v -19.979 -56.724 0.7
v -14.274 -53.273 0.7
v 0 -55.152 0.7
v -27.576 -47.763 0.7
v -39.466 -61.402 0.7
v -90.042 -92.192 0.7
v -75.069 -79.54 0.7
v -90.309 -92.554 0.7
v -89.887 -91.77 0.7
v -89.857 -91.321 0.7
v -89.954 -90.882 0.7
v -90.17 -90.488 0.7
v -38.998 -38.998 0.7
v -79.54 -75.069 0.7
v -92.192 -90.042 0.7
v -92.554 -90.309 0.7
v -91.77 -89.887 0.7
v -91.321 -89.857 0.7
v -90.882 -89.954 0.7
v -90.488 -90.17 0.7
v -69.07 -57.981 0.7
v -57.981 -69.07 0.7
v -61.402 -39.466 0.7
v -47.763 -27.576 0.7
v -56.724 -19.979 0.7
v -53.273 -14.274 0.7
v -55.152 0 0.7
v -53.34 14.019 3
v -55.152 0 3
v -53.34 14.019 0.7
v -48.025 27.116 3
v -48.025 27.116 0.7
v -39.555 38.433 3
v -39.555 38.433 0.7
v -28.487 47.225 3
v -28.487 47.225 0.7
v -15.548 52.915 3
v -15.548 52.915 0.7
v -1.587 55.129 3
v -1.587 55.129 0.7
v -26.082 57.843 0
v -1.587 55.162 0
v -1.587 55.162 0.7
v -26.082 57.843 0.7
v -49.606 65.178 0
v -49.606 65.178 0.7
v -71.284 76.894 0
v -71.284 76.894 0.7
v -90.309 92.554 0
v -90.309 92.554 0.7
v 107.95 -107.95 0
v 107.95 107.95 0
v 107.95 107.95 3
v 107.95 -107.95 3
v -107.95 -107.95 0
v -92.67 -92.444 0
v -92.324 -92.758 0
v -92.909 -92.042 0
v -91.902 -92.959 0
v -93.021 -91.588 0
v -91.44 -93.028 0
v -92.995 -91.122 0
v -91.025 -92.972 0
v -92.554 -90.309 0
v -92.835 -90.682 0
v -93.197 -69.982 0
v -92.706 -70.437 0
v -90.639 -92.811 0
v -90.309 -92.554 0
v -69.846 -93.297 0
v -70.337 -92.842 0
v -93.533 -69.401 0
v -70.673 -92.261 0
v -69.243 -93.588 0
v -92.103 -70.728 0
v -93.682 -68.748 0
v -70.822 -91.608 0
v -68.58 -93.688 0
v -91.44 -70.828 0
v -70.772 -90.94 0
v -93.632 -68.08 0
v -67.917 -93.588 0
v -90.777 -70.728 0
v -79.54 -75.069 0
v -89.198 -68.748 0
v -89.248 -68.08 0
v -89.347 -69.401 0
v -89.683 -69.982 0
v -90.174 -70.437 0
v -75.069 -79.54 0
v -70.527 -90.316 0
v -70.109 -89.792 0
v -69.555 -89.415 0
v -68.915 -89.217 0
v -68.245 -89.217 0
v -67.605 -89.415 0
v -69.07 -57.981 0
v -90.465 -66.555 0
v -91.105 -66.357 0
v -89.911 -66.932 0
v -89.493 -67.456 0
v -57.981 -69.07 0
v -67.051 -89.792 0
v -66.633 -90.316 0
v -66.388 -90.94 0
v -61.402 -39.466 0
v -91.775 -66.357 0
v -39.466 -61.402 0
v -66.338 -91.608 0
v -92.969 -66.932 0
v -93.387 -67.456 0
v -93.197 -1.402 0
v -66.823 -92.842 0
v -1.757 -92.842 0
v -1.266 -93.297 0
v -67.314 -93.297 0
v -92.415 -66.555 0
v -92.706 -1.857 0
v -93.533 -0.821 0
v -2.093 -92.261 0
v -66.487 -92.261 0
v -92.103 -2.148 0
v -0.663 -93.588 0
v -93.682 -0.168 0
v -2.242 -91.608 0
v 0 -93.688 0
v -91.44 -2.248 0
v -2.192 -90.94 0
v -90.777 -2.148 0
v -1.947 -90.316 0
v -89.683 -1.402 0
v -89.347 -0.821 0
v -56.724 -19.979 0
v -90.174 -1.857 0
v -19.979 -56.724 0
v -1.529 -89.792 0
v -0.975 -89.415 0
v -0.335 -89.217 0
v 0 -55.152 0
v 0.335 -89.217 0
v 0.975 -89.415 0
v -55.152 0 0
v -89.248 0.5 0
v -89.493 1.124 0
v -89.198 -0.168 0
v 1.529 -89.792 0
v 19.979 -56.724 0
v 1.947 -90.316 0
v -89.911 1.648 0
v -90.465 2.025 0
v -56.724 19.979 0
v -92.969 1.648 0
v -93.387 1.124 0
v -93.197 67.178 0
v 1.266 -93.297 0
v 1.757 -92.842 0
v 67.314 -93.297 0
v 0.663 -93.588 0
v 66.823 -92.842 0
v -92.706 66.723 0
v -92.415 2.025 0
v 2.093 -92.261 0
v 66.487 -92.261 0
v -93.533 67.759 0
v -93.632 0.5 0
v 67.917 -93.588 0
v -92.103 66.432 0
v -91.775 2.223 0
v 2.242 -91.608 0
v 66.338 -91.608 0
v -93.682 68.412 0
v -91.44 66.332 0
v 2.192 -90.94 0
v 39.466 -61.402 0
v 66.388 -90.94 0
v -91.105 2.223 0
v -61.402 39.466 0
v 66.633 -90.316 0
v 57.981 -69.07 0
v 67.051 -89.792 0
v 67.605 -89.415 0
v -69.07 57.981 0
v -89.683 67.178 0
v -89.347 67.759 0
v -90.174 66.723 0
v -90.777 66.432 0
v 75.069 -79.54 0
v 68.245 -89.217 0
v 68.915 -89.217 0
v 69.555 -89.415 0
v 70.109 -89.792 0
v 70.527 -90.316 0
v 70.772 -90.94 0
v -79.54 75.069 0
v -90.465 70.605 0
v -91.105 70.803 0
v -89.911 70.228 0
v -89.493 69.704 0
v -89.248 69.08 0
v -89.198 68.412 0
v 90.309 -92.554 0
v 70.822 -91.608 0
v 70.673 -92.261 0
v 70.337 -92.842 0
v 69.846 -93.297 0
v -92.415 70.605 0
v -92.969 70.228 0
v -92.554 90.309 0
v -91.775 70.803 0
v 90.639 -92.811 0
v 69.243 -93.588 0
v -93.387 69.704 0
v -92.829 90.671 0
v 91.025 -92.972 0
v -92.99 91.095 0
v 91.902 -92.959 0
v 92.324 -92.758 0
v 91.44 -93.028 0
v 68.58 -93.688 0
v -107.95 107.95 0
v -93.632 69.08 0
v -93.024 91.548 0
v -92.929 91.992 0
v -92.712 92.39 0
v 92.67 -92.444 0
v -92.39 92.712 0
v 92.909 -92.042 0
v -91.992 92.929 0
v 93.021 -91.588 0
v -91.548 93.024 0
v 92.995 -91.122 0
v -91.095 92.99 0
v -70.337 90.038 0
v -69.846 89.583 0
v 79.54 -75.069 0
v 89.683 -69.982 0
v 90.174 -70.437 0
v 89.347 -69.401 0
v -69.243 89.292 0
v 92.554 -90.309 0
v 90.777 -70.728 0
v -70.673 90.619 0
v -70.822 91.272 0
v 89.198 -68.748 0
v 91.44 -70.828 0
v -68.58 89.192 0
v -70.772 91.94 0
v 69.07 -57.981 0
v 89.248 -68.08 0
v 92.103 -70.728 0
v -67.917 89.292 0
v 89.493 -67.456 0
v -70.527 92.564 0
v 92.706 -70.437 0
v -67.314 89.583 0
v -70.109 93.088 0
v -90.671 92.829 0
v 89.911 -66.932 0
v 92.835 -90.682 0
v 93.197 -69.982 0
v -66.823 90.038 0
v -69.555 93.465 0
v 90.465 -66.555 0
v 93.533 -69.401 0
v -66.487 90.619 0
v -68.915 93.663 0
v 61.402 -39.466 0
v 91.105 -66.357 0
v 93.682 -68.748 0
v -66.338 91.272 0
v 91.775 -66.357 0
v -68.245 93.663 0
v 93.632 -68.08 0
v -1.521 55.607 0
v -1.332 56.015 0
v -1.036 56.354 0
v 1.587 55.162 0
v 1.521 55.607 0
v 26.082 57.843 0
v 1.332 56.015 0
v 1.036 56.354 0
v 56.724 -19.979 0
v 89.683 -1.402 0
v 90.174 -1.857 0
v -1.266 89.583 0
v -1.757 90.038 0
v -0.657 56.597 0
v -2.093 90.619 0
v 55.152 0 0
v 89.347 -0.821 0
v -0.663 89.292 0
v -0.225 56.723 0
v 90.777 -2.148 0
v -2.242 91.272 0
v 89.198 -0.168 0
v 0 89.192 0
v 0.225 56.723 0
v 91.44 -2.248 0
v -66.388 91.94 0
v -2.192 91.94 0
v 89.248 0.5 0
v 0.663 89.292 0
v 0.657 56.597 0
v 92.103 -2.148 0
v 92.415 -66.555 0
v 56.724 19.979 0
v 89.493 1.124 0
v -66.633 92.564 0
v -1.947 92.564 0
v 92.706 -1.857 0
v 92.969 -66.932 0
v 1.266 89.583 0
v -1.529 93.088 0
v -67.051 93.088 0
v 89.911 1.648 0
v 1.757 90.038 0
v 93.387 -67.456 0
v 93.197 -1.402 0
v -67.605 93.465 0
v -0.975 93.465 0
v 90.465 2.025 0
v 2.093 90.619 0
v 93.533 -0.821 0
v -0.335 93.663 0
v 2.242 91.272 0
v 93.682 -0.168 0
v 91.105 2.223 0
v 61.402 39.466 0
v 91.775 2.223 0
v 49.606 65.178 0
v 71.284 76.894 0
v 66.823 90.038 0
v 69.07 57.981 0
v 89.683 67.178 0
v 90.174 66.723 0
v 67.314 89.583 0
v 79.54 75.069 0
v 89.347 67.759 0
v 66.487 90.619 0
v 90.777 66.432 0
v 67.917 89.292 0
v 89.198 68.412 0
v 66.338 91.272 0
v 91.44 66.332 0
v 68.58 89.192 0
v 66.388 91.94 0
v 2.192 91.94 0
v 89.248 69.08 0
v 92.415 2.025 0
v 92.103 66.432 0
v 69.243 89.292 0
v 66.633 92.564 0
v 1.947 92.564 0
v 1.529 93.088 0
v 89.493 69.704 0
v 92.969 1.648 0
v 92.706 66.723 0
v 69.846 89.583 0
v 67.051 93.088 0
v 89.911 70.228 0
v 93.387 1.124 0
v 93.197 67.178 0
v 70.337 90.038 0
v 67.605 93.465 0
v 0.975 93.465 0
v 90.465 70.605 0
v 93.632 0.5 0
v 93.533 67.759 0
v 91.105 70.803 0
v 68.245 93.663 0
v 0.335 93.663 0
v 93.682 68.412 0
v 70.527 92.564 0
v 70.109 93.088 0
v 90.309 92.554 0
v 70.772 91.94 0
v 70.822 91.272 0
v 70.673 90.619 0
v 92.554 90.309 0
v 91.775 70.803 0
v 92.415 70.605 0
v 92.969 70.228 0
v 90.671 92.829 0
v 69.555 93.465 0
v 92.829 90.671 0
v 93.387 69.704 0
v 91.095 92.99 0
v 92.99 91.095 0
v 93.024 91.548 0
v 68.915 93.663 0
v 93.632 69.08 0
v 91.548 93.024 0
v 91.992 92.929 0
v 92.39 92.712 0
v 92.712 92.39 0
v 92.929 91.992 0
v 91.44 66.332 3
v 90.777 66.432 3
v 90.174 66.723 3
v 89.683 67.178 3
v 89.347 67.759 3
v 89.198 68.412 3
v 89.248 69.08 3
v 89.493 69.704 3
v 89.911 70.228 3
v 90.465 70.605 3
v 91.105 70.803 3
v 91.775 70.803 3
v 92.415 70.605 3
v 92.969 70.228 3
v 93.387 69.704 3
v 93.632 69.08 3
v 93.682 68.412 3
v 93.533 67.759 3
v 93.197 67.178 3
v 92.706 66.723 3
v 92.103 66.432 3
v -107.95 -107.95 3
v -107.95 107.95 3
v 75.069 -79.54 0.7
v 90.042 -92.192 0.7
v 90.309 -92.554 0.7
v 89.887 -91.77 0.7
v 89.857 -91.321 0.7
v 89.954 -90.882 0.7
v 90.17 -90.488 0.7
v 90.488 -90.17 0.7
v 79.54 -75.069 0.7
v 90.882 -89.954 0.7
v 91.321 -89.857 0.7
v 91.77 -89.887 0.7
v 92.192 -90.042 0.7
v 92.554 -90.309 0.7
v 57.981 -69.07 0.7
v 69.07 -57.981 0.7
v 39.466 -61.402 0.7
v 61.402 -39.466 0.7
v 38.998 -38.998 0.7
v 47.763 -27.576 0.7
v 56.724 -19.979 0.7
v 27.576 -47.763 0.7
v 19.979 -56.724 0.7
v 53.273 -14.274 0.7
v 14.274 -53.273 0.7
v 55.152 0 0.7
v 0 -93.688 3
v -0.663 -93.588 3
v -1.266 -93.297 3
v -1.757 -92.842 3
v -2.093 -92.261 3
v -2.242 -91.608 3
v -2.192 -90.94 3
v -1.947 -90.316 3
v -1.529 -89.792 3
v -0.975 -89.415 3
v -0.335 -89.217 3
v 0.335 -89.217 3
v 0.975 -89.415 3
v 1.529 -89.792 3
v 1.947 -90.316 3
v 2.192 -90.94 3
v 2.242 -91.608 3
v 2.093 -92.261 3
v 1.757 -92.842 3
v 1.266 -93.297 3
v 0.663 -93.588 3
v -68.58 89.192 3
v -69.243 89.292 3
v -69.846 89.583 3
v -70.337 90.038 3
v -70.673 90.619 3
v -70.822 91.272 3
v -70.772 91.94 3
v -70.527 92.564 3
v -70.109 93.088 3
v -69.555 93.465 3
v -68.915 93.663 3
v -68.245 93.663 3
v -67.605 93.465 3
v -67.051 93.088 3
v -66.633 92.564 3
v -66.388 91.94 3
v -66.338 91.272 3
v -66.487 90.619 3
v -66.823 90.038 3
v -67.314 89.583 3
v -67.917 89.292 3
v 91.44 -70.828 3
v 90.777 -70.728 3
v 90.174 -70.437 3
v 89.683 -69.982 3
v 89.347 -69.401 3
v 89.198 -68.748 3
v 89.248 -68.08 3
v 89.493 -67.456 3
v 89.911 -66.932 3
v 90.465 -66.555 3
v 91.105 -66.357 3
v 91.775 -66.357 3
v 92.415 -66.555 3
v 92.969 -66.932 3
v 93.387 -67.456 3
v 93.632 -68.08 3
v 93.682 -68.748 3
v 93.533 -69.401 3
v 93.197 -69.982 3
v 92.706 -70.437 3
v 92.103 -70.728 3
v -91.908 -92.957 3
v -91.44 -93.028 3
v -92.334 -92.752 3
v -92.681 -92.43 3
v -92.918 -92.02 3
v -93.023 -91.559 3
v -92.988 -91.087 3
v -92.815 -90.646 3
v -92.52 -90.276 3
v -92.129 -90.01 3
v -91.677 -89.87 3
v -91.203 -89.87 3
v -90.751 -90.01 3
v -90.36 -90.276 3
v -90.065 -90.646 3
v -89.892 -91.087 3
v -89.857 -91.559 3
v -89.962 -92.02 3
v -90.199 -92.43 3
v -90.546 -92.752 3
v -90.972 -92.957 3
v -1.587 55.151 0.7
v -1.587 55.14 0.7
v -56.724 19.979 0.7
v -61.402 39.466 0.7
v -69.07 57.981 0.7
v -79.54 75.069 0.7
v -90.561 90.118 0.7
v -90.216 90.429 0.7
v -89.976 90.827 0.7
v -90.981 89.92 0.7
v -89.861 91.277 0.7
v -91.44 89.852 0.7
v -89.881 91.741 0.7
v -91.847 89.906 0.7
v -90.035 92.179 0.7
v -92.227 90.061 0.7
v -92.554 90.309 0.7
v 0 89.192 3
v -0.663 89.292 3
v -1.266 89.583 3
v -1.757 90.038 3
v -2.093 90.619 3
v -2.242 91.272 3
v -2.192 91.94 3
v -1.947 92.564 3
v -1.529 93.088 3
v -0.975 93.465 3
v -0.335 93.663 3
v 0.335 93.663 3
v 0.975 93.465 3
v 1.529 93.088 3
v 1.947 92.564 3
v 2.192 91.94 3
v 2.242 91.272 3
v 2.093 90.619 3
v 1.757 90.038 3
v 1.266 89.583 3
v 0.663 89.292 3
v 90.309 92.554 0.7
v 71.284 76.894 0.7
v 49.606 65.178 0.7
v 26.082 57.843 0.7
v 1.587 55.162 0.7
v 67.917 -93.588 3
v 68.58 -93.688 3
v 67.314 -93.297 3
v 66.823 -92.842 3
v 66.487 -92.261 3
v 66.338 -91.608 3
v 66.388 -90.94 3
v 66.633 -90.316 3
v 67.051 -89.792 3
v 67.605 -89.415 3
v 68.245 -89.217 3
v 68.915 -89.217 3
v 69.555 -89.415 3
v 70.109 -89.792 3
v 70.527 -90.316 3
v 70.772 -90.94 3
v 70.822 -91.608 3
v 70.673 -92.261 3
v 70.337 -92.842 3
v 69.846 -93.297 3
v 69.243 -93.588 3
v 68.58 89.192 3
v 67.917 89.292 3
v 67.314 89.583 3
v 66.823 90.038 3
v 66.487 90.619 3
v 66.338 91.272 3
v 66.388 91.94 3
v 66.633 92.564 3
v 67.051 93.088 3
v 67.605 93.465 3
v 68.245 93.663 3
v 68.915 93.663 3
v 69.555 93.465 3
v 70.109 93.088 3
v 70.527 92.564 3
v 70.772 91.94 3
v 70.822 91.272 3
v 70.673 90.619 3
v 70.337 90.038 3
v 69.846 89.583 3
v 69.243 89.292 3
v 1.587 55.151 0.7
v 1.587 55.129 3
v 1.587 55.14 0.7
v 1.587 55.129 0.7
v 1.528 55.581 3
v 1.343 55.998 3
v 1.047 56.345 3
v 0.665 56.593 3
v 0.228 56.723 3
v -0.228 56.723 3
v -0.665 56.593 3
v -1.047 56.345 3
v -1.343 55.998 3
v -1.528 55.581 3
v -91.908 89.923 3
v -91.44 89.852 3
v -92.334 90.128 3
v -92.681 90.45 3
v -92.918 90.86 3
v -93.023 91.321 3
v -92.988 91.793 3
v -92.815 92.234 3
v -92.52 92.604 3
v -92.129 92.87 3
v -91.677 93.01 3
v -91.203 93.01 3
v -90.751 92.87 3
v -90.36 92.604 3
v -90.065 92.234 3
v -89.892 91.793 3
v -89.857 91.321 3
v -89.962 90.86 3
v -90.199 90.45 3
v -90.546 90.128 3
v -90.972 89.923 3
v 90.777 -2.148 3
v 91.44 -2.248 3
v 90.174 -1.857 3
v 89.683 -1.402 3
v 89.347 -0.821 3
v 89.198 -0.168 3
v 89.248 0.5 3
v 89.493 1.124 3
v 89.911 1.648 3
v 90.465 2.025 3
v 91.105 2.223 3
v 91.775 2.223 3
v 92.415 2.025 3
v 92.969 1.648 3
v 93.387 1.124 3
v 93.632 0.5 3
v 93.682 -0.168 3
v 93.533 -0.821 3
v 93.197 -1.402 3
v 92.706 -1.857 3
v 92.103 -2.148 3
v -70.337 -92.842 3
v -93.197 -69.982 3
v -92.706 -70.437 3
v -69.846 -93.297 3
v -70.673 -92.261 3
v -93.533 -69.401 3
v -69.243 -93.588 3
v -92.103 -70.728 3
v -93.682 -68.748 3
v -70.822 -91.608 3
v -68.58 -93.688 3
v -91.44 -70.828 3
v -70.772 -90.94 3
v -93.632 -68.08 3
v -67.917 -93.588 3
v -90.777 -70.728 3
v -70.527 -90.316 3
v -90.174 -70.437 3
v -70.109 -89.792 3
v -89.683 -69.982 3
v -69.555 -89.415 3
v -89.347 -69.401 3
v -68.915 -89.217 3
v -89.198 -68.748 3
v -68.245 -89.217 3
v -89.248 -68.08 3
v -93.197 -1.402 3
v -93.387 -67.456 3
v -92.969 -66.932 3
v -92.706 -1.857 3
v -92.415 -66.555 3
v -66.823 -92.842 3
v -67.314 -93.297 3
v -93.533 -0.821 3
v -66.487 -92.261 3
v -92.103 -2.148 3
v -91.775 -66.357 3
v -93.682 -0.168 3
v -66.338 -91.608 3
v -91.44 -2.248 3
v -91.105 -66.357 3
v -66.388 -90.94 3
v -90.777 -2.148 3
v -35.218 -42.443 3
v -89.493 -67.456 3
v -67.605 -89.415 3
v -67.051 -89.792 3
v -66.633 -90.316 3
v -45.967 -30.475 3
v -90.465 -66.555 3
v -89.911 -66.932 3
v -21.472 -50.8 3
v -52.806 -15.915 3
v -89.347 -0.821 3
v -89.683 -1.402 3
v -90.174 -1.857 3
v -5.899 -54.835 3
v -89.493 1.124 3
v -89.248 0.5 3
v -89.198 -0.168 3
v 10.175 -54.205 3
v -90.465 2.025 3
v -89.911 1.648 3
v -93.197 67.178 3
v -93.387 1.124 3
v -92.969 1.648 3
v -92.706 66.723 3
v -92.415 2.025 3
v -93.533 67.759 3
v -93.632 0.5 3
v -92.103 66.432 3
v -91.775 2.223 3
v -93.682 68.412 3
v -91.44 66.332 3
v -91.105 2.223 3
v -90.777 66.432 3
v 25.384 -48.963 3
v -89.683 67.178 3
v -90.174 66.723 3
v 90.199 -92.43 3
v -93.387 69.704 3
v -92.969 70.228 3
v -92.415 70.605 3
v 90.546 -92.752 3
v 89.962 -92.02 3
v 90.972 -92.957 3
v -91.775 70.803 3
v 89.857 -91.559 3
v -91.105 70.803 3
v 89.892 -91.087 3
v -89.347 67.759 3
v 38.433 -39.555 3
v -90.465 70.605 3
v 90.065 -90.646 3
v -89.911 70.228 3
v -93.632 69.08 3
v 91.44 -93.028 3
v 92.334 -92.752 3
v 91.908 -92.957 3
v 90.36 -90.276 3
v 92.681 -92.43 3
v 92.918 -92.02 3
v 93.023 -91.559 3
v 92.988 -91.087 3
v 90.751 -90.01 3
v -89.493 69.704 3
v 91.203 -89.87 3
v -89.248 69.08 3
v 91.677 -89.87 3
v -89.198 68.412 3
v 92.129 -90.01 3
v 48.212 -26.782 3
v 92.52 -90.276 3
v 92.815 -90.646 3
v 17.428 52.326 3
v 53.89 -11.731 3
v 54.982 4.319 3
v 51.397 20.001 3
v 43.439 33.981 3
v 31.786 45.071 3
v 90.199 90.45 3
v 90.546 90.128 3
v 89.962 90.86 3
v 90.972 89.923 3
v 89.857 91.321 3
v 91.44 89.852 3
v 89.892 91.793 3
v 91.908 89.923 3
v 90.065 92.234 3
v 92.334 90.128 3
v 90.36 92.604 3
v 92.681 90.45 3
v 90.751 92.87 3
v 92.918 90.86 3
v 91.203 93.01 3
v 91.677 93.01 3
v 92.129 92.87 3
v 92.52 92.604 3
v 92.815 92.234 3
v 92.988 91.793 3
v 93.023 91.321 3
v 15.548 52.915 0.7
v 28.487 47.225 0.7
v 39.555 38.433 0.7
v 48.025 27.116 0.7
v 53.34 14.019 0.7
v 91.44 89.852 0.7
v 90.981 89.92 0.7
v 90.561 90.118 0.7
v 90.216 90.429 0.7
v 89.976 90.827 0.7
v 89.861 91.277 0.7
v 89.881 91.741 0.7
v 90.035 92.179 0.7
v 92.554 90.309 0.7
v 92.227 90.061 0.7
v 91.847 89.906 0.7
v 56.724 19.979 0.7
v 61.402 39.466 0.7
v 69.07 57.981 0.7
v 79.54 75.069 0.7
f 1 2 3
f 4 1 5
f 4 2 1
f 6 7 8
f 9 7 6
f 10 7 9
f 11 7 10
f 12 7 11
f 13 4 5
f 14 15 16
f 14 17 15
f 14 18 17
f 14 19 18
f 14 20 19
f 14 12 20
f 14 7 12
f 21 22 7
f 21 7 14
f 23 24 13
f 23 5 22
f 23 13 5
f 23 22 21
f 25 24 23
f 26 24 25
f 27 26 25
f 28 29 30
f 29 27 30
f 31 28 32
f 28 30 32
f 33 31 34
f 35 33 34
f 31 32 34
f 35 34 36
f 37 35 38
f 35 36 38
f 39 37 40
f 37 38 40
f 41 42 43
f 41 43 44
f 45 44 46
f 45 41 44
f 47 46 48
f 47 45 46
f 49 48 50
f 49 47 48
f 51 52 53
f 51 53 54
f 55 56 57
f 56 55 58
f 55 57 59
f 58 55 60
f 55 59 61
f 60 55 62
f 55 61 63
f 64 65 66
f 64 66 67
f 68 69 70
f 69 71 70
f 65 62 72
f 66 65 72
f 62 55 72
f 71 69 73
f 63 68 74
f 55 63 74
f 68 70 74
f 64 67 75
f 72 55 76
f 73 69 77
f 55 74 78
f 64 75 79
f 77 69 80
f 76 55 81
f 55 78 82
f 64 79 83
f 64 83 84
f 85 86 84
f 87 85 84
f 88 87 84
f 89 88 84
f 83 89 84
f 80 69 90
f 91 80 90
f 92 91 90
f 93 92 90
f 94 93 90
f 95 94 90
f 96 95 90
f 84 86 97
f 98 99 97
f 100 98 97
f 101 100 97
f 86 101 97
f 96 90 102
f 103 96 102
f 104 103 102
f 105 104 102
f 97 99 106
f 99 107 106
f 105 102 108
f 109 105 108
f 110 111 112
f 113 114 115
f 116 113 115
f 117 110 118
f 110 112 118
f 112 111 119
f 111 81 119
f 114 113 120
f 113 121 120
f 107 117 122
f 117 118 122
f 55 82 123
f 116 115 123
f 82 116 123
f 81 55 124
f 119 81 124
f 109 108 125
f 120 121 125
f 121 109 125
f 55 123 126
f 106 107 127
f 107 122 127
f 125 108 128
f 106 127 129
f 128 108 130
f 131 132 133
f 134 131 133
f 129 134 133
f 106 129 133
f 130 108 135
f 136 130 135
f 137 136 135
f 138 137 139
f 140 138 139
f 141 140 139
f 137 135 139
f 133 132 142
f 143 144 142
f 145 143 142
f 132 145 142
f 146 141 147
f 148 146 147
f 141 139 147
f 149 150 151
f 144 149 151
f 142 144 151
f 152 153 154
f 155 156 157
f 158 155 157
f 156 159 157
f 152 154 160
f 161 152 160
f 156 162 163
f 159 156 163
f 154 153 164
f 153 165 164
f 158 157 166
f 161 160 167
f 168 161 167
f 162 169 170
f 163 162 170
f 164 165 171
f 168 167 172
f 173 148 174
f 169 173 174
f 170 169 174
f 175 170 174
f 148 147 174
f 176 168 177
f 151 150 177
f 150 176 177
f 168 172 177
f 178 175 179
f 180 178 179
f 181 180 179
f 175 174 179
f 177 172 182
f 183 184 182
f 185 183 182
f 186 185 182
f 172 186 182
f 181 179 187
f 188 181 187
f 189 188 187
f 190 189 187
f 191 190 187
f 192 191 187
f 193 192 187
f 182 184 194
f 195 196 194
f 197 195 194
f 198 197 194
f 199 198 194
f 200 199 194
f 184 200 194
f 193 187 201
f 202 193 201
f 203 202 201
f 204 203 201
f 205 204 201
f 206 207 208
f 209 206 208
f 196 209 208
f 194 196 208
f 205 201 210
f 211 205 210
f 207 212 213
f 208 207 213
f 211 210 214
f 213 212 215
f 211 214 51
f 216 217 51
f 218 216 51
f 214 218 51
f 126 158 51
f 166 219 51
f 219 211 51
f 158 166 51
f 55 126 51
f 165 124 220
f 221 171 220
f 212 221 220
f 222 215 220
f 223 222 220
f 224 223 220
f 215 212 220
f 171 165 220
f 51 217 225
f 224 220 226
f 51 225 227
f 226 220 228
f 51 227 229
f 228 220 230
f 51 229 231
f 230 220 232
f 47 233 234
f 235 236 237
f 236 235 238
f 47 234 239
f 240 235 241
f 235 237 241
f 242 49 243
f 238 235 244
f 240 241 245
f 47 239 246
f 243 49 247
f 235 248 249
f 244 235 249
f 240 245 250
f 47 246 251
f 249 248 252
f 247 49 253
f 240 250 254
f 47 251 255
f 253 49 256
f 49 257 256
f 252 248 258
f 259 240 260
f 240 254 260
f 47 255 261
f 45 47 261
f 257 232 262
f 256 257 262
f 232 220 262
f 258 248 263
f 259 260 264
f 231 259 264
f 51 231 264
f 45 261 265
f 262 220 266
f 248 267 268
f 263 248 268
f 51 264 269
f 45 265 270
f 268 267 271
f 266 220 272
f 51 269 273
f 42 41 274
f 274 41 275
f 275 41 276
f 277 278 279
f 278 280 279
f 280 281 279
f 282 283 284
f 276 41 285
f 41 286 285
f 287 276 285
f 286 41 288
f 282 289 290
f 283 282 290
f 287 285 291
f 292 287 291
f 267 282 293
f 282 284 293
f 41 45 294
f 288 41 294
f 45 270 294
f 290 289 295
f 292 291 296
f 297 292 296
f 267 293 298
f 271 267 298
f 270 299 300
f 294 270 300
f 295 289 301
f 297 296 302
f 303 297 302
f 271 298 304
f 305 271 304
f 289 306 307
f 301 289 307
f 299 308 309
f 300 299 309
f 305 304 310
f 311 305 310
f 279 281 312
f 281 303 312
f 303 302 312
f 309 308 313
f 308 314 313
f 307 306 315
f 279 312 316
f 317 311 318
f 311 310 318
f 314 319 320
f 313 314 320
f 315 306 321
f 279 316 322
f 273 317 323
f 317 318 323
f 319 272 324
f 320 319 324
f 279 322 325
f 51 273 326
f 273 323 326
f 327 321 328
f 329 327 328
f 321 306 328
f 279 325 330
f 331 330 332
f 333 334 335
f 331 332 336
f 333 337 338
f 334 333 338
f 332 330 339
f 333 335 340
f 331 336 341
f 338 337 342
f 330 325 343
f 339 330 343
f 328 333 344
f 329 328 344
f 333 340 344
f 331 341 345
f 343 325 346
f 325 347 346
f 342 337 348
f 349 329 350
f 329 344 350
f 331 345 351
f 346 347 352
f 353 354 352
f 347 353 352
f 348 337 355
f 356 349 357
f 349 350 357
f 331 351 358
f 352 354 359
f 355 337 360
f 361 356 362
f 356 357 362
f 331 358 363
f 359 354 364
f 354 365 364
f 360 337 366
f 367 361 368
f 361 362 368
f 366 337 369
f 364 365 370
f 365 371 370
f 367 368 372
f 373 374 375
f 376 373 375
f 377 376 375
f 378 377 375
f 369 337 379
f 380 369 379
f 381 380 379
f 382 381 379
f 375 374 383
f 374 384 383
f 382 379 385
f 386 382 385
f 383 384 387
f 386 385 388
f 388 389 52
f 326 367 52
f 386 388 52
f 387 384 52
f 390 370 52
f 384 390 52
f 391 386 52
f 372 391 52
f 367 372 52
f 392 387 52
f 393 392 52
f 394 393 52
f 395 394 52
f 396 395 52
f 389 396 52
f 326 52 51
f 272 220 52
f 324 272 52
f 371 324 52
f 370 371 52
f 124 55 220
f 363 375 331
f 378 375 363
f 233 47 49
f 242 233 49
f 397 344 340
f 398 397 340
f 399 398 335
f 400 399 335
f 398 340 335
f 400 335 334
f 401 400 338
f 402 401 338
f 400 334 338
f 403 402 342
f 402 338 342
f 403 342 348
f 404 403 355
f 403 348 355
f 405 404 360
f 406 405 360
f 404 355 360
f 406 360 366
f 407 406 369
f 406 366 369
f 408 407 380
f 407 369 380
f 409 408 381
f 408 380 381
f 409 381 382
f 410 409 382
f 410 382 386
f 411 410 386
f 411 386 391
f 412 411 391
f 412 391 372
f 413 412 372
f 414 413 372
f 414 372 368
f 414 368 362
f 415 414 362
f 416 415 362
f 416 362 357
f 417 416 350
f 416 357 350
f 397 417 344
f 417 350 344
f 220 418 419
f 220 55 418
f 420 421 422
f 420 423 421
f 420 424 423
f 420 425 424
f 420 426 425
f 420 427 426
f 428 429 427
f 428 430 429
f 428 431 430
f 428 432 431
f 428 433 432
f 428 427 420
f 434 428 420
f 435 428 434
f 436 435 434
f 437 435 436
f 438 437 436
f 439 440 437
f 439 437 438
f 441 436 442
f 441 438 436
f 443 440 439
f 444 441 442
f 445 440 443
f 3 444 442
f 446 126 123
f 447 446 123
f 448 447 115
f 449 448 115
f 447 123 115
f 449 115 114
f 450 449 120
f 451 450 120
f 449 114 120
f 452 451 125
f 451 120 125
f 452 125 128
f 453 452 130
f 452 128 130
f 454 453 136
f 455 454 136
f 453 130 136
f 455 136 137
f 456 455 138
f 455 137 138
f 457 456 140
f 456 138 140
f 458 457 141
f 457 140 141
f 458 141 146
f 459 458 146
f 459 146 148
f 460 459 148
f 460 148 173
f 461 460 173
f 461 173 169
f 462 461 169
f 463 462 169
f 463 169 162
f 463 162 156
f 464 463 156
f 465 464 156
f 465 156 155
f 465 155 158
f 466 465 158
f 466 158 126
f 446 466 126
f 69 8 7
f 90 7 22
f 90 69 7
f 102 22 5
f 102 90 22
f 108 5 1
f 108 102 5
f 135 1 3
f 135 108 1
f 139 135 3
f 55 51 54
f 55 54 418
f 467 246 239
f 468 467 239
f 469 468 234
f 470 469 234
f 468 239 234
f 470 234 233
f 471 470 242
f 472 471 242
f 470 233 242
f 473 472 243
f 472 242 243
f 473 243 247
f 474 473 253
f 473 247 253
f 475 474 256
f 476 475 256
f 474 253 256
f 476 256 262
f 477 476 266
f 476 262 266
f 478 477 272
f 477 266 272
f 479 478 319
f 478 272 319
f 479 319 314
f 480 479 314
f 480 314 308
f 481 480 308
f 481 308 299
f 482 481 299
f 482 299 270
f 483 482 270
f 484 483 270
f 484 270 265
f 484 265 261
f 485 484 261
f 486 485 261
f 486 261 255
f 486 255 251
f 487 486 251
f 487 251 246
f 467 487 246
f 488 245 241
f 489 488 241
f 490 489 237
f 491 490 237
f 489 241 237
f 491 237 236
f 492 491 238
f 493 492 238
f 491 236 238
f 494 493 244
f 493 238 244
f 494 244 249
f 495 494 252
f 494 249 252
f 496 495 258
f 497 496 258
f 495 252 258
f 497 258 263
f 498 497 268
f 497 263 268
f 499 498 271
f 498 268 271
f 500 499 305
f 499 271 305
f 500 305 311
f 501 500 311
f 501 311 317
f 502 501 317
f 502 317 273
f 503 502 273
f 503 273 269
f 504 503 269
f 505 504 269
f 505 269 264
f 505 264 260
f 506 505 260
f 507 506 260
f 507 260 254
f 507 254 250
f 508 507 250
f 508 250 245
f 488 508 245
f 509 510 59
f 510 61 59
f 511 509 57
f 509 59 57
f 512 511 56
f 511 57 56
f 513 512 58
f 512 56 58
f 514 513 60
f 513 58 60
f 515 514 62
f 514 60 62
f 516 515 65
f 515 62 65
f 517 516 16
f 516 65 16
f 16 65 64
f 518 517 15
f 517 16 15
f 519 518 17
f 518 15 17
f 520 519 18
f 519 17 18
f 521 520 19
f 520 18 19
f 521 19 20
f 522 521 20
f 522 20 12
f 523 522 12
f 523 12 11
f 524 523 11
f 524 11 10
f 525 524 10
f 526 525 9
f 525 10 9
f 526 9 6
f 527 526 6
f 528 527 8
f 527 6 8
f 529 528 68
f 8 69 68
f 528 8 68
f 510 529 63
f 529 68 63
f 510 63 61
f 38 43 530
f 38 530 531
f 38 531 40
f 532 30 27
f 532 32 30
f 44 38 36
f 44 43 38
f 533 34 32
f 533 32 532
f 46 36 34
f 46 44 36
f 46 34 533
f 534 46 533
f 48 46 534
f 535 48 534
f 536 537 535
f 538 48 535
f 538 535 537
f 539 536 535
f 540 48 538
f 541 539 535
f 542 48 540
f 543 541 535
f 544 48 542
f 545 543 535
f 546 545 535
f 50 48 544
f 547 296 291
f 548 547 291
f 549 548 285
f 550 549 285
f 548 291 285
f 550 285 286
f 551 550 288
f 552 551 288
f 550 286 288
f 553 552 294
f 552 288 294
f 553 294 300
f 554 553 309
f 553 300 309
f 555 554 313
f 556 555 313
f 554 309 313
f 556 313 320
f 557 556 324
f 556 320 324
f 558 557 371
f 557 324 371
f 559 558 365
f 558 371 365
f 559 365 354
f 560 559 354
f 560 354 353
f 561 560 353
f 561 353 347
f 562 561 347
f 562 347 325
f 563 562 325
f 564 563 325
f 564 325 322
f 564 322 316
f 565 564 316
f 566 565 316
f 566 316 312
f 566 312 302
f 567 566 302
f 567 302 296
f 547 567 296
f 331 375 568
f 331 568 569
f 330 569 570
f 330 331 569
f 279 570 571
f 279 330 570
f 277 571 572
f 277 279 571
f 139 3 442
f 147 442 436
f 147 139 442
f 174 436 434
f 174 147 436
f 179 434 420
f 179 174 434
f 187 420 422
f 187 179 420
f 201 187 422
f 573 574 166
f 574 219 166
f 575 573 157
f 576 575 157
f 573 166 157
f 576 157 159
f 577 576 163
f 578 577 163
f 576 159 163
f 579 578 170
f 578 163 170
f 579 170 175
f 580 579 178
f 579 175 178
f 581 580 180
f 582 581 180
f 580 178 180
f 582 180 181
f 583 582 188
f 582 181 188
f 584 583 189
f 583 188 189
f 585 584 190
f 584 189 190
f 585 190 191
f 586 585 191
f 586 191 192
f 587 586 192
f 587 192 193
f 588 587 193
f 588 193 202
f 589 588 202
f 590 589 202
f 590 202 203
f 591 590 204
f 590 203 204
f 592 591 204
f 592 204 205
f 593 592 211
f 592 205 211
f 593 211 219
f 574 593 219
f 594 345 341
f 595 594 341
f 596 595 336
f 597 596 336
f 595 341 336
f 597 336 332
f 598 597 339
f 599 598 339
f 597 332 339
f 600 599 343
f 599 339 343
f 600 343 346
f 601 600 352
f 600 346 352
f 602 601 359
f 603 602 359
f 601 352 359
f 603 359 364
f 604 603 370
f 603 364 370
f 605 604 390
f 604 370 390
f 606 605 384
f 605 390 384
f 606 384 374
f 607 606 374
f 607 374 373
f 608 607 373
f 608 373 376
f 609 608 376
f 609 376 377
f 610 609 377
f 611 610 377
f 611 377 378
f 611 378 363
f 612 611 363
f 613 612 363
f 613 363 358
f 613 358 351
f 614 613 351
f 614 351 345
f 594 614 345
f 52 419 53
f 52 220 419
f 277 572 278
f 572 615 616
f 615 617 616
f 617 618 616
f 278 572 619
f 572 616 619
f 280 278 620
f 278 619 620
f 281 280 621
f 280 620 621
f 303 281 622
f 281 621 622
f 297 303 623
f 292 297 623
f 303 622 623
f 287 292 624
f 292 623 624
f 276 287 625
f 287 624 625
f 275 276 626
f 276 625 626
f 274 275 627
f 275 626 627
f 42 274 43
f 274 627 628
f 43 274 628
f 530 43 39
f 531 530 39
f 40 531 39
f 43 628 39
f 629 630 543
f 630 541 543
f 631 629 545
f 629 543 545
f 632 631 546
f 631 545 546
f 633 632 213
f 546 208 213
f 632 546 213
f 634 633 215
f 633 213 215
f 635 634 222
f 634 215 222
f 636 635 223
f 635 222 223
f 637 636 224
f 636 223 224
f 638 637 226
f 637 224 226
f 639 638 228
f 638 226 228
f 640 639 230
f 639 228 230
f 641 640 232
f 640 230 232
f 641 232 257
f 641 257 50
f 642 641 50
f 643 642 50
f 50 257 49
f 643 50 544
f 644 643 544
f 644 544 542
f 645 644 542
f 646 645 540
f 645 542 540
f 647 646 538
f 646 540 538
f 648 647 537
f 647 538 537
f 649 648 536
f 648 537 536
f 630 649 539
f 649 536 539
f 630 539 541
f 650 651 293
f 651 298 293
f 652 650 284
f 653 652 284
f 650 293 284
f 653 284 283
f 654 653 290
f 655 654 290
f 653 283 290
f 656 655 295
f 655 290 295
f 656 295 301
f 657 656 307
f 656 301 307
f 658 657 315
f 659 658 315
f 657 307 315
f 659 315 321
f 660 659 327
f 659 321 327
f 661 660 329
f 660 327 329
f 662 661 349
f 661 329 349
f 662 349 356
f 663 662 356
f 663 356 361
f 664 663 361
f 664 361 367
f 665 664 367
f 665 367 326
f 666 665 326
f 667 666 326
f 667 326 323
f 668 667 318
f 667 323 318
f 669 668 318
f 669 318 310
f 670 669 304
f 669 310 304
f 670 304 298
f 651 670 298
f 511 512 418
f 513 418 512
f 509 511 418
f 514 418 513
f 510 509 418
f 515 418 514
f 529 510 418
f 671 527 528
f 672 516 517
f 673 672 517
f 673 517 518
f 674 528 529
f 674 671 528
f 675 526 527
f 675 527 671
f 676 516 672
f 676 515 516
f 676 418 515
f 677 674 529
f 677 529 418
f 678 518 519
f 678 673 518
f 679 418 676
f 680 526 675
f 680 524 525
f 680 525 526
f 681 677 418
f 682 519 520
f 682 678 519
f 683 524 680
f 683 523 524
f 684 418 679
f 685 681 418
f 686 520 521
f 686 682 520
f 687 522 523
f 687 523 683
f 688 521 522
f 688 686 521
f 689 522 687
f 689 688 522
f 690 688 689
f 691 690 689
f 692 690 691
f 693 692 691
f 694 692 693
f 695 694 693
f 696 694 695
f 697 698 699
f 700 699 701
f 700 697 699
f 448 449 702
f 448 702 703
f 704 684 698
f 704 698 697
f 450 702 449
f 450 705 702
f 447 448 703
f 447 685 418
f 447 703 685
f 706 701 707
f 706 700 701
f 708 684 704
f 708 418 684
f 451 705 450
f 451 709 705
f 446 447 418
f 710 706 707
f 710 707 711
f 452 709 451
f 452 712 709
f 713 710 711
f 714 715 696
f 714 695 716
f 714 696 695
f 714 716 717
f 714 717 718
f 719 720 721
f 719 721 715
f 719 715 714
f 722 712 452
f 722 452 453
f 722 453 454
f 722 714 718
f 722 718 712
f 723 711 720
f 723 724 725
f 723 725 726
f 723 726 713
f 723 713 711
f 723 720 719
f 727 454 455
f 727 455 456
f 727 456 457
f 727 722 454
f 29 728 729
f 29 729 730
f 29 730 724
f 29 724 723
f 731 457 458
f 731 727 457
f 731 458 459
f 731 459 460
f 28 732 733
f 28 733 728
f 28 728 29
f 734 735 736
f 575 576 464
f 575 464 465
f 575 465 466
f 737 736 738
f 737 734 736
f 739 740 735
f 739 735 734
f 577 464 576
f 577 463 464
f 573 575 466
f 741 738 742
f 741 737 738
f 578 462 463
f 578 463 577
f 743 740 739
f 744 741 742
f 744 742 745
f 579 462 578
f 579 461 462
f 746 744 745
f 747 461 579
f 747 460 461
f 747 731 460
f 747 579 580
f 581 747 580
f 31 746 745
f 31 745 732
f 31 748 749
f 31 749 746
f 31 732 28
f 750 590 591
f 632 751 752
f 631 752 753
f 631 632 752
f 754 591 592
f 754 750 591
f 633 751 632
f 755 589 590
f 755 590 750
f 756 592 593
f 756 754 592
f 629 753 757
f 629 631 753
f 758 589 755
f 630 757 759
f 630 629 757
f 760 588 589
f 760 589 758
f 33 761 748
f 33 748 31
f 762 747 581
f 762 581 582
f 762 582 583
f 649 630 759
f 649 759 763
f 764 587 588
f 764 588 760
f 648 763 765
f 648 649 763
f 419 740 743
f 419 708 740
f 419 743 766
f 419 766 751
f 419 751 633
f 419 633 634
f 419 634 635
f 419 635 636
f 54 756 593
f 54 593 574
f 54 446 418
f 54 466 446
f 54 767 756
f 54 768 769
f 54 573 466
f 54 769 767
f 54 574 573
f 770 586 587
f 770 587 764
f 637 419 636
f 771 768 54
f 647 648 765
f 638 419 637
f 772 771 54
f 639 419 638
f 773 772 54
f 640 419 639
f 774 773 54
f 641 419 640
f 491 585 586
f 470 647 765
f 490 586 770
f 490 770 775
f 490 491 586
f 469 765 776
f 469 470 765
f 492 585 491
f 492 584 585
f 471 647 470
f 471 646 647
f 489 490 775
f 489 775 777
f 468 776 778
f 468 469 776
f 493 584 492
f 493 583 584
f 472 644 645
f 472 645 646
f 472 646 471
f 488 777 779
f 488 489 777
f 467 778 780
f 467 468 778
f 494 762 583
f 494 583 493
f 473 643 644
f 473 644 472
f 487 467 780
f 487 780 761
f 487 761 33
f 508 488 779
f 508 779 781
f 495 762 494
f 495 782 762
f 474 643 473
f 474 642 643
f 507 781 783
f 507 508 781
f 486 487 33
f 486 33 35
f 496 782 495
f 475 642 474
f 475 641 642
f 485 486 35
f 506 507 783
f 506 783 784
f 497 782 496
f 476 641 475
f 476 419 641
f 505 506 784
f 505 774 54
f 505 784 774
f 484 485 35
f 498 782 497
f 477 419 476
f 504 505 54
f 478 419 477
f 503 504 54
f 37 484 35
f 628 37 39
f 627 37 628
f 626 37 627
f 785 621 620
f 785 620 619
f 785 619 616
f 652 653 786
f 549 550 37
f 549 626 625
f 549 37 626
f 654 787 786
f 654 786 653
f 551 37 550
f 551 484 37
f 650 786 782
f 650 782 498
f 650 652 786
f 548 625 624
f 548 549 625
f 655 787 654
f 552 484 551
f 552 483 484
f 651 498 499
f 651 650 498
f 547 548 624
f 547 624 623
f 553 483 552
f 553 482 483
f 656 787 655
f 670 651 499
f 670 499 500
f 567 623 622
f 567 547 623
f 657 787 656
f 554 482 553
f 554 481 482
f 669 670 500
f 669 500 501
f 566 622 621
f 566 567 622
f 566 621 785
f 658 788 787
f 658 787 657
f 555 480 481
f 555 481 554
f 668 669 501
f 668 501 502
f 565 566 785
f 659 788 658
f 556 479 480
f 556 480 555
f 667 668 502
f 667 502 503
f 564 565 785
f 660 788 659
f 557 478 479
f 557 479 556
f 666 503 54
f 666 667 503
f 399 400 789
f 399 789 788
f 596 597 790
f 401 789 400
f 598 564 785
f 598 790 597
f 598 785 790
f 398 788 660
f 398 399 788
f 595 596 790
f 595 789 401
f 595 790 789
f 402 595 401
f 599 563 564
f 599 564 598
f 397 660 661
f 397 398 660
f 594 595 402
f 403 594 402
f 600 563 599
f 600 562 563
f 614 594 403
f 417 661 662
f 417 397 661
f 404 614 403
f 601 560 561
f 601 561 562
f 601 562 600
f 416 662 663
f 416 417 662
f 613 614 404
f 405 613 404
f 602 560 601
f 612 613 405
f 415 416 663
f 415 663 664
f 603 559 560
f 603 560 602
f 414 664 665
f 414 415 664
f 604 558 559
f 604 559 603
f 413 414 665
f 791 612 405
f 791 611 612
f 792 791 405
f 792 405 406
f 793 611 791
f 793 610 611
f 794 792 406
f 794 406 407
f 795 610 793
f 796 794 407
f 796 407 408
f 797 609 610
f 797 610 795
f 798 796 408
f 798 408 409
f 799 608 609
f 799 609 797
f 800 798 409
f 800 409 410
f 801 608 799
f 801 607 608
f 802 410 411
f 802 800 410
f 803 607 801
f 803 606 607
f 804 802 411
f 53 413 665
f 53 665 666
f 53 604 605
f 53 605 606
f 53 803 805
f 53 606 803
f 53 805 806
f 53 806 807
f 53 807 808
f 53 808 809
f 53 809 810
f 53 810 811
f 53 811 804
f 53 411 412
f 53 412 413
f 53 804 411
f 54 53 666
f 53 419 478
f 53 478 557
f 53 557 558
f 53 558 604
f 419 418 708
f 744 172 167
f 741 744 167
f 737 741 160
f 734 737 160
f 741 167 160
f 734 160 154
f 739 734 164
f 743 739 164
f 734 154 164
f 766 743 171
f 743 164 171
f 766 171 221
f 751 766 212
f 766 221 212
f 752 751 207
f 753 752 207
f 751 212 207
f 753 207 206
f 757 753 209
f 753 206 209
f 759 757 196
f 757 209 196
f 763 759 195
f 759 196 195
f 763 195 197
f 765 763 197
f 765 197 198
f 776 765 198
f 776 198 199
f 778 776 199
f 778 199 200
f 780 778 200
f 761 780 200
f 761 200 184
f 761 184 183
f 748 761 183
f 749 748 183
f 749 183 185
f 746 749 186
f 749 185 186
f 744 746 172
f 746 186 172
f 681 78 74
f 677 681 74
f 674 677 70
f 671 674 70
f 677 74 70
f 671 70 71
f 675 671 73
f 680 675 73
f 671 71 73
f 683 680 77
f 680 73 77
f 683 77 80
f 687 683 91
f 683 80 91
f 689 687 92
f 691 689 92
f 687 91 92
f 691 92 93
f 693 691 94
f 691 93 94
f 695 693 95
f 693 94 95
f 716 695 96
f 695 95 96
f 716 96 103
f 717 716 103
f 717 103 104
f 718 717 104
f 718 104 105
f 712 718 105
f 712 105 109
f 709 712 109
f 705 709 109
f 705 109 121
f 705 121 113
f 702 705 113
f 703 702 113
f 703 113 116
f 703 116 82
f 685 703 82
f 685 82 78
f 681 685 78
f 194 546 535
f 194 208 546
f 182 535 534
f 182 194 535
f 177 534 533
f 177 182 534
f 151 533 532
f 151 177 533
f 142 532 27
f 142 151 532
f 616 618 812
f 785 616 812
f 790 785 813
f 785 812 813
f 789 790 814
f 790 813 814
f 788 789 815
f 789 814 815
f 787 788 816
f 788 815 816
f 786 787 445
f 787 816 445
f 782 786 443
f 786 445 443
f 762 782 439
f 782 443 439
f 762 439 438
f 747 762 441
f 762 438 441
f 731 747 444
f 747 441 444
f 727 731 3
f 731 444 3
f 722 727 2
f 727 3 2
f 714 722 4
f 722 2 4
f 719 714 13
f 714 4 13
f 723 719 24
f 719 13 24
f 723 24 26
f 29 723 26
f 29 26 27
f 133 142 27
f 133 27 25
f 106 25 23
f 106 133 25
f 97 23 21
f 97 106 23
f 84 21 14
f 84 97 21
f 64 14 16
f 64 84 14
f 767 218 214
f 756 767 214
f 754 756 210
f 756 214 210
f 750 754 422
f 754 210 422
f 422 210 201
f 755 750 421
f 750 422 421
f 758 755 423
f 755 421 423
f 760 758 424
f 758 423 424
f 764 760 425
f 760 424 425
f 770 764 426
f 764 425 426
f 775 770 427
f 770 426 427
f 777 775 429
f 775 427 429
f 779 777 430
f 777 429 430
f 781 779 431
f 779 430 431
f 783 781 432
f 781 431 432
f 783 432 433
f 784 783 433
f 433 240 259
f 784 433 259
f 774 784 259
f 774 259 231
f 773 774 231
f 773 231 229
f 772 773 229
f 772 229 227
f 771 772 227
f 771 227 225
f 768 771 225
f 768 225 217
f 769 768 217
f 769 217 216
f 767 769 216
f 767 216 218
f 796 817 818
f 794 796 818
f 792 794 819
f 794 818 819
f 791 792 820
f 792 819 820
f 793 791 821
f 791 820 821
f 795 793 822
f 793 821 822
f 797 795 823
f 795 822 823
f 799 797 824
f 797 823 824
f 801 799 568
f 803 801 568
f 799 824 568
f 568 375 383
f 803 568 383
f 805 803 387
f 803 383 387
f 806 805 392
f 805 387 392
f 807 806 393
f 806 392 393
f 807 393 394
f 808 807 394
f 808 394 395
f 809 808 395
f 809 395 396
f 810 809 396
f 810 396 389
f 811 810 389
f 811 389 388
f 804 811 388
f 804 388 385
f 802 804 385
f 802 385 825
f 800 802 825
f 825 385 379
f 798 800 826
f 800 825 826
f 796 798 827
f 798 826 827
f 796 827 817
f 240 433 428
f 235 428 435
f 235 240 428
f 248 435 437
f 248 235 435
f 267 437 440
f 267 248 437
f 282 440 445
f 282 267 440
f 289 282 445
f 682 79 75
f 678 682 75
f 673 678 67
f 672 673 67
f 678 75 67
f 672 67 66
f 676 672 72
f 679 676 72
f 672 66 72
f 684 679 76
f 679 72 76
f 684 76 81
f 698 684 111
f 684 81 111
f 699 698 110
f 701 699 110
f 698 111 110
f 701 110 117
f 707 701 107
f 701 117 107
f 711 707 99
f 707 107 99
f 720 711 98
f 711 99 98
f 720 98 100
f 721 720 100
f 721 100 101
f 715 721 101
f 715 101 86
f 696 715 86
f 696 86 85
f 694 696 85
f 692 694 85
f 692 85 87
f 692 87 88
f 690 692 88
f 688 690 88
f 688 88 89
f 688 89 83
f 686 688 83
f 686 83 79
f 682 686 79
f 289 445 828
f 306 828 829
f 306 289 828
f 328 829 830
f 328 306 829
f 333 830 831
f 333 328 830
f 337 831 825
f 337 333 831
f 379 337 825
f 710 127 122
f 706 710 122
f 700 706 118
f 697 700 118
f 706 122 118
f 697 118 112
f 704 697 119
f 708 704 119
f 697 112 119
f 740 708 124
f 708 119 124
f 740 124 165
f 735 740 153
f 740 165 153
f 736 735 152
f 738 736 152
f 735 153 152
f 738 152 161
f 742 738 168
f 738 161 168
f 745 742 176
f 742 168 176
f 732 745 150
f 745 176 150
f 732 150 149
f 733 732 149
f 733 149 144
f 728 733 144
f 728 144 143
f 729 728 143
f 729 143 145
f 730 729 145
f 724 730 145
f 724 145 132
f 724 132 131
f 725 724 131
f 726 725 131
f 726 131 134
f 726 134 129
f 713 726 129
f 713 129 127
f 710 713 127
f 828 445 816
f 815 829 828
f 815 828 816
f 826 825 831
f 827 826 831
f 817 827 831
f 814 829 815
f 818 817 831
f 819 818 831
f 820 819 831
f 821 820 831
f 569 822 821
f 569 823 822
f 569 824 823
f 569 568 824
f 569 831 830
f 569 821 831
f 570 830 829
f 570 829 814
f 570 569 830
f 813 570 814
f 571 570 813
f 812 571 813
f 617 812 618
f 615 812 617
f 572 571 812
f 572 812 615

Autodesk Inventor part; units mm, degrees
ref_plane "YZ Plane" through (0, 0, 0) normal (1, 0, 0) x (0, 1, 0)
ref_plane "XZ Plane" through (0, 0, 0) normal (0, 1, 0) x (-1, 0, 0)
ref_plane "XY Plane" through (0, 0, 0) normal (0, 0, 1) x (1, 0, 0)
sketch "Sketch1" plane through (0, 0, 0) normal (0, 0, 1) x (1, 0, 0)
  line L0 (-107.95, 107.95) -> (107.95, 107.95)
  line L1 (107.95, 107.95) -> (107.95, -107.95)
  line L2 (107.95, -107.95) -> (-107.95, -107.95)
  line L3 (-107.95, -107.95) -> (-107.95, 107.95)
  line L4 (-107.95, -107.95) -> (107.95, 107.95) construction
  point P0 (0, 0)
  point P1 (0, 0)
  dimension "d0" = 215.9
  dimension "d1" = 215.9
extrude "Extrusion1" add sketch "Sketch1" along normal blind 3
sketch "Sketch3" plane through (0, 0, 0) normal (0, 0, -1) x (-1, 0, 0)
  line L0 (256.032, 0) -> (-256.032, 0) construction
  line L1 (0, -256.032) -> (0, 256.032) construction
  line L2 (-101.6, 101.6) -> (101.6, 101.6) construction
  line L3 (-101.6, -101.6) -> (101.6, -101.6) construction
  line L4 (101.6, 101.6) -> (-101.6, -101.6) construction
  line L5 (101.6, -101.6) -> (-101.6, 101.6) construction
  arc A0 (-90.3175, 92.5625) -> (-92.5625, 92.5625) centre (-91.44, 91.44) ccw
  arc A1 (-90.3175, 92.5625) -> (0, 55.1518) centre (0, 182.88) ccw
  line L6 (-91.44, 91.44) -> (0, 182.88) construction
  arc A2 (-92.5625, 92.5625) -> (-92.5625, 90.3175) centre (-91.44, 91.44) ccw
  arc A3 (-55.1518, 0) -> (-92.5625, 90.3175) centre (-182.88, 0) ccw
  arc A4 (92.5625, 92.5625) -> (90.3175, 92.5625) centre (91.44, 91.44) ccw
  arc A5 (0, 55.1518) -> (90.3175, 92.5625) centre (0, 182.88) ccw
  arc A6 (92.5625, 90.3175) -> (55.1518, 0) centre (182.88, 0) ccw
  arc A7 (92.5625, 90.3175) -> (92.5625, 92.5625) centre (91.44, 91.44) ccw
  arc A8 (-92.5625, -92.5625) -> (-90.3175, -92.5625) centre (-91.44, -91.44) ccw
  arc A9 (0, -55.1518) -> (-90.3175, -92.5625) centre (0, -182.88) ccw
  arc A10 (-92.5625, -90.3175) -> (-55.1518, 0) centre (-182.88, 0) ccw
  arc A11 (-92.5625, -90.3175) -> (-92.5625, -92.5625) centre (-91.44, -91.44) ccw
  arc A12 (55.1518, 0) -> (92.5625, -90.3175) centre (182.88, 0) ccw
  arc A13 (90.3175, -92.5625) -> (0, -55.1518) centre (0, -182.88) ccw
  arc A14 (90.3175, -92.5625) -> (92.5625, -92.5625) centre (91.44, -91.44) ccw
  arc A15 (92.5625, -92.5625) -> (92.5625, -90.3175) centre (91.44, -91.44) ccw
  point P0 (0, 0)
  dimension "d168" = 3.175
  dimension "d169" = 91.44
extrude "Extrusion5" cut sketch "Sketch3" against normal blind 0.7
sketch "Sketch6" plane through (0, 0, 0.7) normal (0, 0, -1) x (-1, 0, 0)
  circle A0 centre (0, 0) radius 55.1518
  arc A1 (-90.3175, 92.5625) -> (-92.5625, 90.3175) centre (-91.44, 91.44) ccw
  arc A2 (-92.5625, -90.3175) -> (-92.5625, 90.3175) centre (-182.88, 0) ccw
  arc A3 (-92.5625, -90.3175) -> (-90.3175, -92.5625) centre (-91.44, -91.44) ccw
  arc A4 (90.3175, -92.5625) -> (-90.3175, -92.5625) centre (0, -182.88) ccw
  arc A5 (90.3175, -92.5625) -> (92.5625, -90.3175) centre (91.44, -91.44) ccw
  arc A6 (92.5625, 90.3175) -> (92.5625, -90.3175) centre (182.88, 0) ccw
  arc A7 (92.5625, 90.3175) -> (90.3175, 92.5625) centre (91.44, 91.44) ccw
  arc A8 (-90.3175, 92.5625) -> (90.3175, 92.5625) centre (0, 182.88) ccw
  arc A9 (-90.3175, 92.5625) -> (90.3175, 92.5625) centre (0, 182.88) ccw
  point P0 (0, 0)
extrude "Extrusion6" cut sketch "Sketch6" against normal up to next contours A0
sketch "Sketch11" plane through (0, 0, 3) normal (0, 0, 1) x (1, 0, 0)
  line L0 (-91.44, 91.44) -> (91.44, 91.44) construction
  line L1 (91.44, 91.44) -> (91.44, -91.44) construction
  line L2 (91.44, -91.44) -> (-91.44, -91.44) construction
  line L3 (-91.44, -91.44) -> (-91.44, 91.44) construction
  line L4 (-151.13, 0) -> (151.13, 0) construction
  line L5 (0, -151.13) -> (0, 151.13) construction
  point P0 (0, 0)
  dimension "d170" = 182.88
  dimension "d171" = 182.88
hole "Hole15" at (-91.44, 91.44, 3) at (91.44, 91.44, 3) at (91.44, -91.44, 3) at (-91.44, -91.44, 3) direction (0, 0, -1) diameter 3.175 end through all
sketch "Sketch13" plane through (0, 0, 3) normal (0, 0, 1) x (1, 0, 0)
  line L0 (-91.44, -91.44) -> (91.44, -91.44) construction
  line L1 (91.44, -91.44) -> (91.44, 91.44) construction
  line L2 (91.44, 91.44) -> (-91.44, 91.44) construction
  line L3 (-91.44, 91.44) -> (-91.44, -91.44) construction
  line L4 (-91.44, -91.44) -> (91.44, 91.44) construction
  line L5 (-151.13, 0) -> (151.13, 0) construction
  line L6 (0, -151.13) -> (0, 151.13) construction
  point P0 (0, 0)
  point P1 (0, 0)
  point P2 (-68.58, 91.44)
  point P3 (0, 91.44)
  point P4 (68.58, 91.44)
  point P5 (91.44, 68.58)
  point P6 (91.44, 0)
  point P7 (91.44, -68.58)
  point P8 (68.58, -91.44)
  point P9 (0, -91.44)
  point P10 (-68.58, -91.44)
  point P11 (-91.44, -68.58)
  point P12 (-91.44, 0)
  point P13 (-91.44, 68.58)
  dimension "d302" = 182.88
  dimension "d303" = 182.88
  dimension "d304" = 22.86
  dimension "d305" = 22.86
hole "Hole29" at (-68.58, 91.44, 3) at (0, 91.44, 3) at (68.58, 91.44, 3) at (91.44, 68.58, 3) at (91.44, 0, 3) at (91.44, -68.58, 3) at (68.58, -91.44, 3) at (0, -91.44, 3) at (-68.58, -91.44, 3) at (-91.44, -68.58, 3) at (-91.44, 0, 3) at (-91.44, 68.58, 3) direction (0, 0, -1) diameter 4.4958 end through all clearance for "Flat Head Machine Screw (82)" size "#8" standard "Ansi Unified Screw Threads"
sketch "Sketch14" plane through (0, 0, 3) normal (0, 0, 1) x (1, 0, 0)
  circle A0 centre (0, 0) radius 55.1518 projected
  line L0 (0, -151.13) -> (0, 151.13) construction
  circle A1 centre (0, 55.1518) radius 1.5875
  point P0 (0, 0)
  dimension "d313" = 3.175
extrude "Extrusion9" cut sketch "Sketch14" against normal through all contours A1 A0 | A0 A1 picked at (0.0632, 54.6247) picked at (0.0603, 55.6758)
equation "\"d1\" = d0"
properties part number "J002446_1" material "UHMW, WHITE"
